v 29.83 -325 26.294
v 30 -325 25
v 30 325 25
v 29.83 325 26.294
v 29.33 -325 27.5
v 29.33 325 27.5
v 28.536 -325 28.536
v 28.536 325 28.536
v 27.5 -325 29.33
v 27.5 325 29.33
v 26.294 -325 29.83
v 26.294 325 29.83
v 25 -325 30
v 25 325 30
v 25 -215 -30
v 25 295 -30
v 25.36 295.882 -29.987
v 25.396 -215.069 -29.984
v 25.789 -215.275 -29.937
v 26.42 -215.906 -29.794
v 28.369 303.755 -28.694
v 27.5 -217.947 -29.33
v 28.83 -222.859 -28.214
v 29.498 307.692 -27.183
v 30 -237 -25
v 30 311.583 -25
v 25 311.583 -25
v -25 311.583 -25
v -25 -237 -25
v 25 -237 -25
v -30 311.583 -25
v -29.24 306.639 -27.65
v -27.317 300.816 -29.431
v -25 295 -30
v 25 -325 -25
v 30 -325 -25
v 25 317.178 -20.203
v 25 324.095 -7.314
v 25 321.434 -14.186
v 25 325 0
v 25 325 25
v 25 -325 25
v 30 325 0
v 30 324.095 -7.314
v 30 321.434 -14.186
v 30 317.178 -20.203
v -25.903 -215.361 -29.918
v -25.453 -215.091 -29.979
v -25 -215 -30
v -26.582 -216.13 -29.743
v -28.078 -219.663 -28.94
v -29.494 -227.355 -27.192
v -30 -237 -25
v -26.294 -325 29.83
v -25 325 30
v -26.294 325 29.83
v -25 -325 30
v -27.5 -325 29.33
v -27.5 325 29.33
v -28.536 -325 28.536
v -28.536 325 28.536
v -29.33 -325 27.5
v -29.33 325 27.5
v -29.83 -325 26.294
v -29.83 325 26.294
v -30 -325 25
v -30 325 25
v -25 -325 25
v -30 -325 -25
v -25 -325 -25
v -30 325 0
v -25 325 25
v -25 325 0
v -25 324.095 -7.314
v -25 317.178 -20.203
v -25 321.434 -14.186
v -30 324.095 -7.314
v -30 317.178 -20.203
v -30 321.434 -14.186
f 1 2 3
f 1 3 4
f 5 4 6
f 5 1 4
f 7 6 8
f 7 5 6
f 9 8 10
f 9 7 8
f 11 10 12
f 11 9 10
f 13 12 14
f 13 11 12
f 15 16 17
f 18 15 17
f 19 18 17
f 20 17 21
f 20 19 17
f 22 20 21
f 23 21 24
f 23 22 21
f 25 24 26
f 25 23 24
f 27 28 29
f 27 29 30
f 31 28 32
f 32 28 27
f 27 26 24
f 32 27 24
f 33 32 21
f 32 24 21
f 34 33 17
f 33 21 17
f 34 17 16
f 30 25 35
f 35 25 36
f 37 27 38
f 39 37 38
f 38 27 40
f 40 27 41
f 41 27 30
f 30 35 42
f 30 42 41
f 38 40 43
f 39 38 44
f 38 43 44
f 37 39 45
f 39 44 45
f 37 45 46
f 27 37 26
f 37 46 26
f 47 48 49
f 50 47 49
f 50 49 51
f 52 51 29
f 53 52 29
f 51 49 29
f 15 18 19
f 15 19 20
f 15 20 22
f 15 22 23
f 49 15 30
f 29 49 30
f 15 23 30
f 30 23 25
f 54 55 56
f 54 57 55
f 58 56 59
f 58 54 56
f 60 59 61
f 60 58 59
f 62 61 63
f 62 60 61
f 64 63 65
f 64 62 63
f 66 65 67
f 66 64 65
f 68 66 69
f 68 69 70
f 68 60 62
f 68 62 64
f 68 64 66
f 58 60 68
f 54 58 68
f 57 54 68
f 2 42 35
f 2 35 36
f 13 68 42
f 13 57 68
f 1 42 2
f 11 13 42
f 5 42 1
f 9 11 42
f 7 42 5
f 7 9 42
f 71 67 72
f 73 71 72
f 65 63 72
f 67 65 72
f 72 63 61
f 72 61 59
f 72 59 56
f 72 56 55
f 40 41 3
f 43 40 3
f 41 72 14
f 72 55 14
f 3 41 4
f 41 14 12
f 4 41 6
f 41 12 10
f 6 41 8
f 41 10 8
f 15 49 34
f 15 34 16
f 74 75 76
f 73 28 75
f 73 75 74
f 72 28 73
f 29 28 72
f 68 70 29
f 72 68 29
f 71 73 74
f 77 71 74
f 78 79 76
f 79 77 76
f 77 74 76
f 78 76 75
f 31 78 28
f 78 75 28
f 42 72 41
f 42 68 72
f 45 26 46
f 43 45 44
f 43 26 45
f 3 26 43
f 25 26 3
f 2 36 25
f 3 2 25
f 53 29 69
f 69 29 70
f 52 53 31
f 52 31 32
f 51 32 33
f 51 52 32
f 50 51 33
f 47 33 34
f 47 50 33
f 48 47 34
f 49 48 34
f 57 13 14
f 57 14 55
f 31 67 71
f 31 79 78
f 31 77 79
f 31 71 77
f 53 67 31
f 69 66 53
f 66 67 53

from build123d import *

# Parameters (mm, degrees)
F0_W     = 50
F0_H     = 50
F1_DEPTH = 325
F3_DEPTH = 60.001


# Not quite as in the source:
# - a feature names something its author has since deleted; it is built from what else it names


with BuildPart() as f1:
    # F0 (on Front) → F1 (new body, symmetric)
    with BuildSketch(Plane.XZ):
        with BuildLine():
            Line((-25, -30), (25, -30))
            ThreePointArc((25, -30), (28.5355339059, -28.5355339059), (30, -25))
            Line((30, -25), (30, 25))
            ThreePointArc((30, 25), (28.5355339059, 28.5355339059), (25, 30))
            Line((25, 30), (-25, 30))
            ThreePointArc((-25, 30), (-28.5355339059, 28.5355339059), (-30, 25))
            Line((-30, 25), (-30, -25))
            ThreePointArc((-30, -25), (-28.5355339059, -28.5355339059), (-25, -30))
        make_face()
        Rectangle(F0_W, F0_H, mode=Mode.SUBTRACT)
    extrude(amount=F1_DEPTH, both=True)

    # F2 (on face) → F3 (cut, through all)
    with BuildSketch(Plane.YZ.offset(30)):
        Polygon((-325, -5), (-347.579985857, -5), (-354.4286191463, -50.3063426539), (-215, -50.3063426539), (-215, -30), (-237, -25), (-325, -25), align=None)
        with BuildLine():
            Line((325, -25), (311.5831239518, -25))
            ThreePointArc((311.5831239518, -25), (303.6602540378, -28.7228132327), (295, -30))
            Line((295, -30), (295, -47.2164526592))
            Line((295, -47.2164526592), (357.106402663, -47.2164526592))
            Line((357.106402663, -47.2164526592), (357.106402663, 0))
            Line((357.106402663, 0), (325, 0))
            Line((325, 0), (325, -25))
        make_face()
        with BuildLine():
            ThreePointArc((325, 0), (321.4338203685, -14.1863716546), (311.5831239518, -25))
            Line((311.5831239518, -25), (325, -25))
            Line((325, -25), (325, 0))
        make_face()
    extrude(amount=-F3_DEPTH, mode=Mode.SUBTRACT)


solid = f1.part
